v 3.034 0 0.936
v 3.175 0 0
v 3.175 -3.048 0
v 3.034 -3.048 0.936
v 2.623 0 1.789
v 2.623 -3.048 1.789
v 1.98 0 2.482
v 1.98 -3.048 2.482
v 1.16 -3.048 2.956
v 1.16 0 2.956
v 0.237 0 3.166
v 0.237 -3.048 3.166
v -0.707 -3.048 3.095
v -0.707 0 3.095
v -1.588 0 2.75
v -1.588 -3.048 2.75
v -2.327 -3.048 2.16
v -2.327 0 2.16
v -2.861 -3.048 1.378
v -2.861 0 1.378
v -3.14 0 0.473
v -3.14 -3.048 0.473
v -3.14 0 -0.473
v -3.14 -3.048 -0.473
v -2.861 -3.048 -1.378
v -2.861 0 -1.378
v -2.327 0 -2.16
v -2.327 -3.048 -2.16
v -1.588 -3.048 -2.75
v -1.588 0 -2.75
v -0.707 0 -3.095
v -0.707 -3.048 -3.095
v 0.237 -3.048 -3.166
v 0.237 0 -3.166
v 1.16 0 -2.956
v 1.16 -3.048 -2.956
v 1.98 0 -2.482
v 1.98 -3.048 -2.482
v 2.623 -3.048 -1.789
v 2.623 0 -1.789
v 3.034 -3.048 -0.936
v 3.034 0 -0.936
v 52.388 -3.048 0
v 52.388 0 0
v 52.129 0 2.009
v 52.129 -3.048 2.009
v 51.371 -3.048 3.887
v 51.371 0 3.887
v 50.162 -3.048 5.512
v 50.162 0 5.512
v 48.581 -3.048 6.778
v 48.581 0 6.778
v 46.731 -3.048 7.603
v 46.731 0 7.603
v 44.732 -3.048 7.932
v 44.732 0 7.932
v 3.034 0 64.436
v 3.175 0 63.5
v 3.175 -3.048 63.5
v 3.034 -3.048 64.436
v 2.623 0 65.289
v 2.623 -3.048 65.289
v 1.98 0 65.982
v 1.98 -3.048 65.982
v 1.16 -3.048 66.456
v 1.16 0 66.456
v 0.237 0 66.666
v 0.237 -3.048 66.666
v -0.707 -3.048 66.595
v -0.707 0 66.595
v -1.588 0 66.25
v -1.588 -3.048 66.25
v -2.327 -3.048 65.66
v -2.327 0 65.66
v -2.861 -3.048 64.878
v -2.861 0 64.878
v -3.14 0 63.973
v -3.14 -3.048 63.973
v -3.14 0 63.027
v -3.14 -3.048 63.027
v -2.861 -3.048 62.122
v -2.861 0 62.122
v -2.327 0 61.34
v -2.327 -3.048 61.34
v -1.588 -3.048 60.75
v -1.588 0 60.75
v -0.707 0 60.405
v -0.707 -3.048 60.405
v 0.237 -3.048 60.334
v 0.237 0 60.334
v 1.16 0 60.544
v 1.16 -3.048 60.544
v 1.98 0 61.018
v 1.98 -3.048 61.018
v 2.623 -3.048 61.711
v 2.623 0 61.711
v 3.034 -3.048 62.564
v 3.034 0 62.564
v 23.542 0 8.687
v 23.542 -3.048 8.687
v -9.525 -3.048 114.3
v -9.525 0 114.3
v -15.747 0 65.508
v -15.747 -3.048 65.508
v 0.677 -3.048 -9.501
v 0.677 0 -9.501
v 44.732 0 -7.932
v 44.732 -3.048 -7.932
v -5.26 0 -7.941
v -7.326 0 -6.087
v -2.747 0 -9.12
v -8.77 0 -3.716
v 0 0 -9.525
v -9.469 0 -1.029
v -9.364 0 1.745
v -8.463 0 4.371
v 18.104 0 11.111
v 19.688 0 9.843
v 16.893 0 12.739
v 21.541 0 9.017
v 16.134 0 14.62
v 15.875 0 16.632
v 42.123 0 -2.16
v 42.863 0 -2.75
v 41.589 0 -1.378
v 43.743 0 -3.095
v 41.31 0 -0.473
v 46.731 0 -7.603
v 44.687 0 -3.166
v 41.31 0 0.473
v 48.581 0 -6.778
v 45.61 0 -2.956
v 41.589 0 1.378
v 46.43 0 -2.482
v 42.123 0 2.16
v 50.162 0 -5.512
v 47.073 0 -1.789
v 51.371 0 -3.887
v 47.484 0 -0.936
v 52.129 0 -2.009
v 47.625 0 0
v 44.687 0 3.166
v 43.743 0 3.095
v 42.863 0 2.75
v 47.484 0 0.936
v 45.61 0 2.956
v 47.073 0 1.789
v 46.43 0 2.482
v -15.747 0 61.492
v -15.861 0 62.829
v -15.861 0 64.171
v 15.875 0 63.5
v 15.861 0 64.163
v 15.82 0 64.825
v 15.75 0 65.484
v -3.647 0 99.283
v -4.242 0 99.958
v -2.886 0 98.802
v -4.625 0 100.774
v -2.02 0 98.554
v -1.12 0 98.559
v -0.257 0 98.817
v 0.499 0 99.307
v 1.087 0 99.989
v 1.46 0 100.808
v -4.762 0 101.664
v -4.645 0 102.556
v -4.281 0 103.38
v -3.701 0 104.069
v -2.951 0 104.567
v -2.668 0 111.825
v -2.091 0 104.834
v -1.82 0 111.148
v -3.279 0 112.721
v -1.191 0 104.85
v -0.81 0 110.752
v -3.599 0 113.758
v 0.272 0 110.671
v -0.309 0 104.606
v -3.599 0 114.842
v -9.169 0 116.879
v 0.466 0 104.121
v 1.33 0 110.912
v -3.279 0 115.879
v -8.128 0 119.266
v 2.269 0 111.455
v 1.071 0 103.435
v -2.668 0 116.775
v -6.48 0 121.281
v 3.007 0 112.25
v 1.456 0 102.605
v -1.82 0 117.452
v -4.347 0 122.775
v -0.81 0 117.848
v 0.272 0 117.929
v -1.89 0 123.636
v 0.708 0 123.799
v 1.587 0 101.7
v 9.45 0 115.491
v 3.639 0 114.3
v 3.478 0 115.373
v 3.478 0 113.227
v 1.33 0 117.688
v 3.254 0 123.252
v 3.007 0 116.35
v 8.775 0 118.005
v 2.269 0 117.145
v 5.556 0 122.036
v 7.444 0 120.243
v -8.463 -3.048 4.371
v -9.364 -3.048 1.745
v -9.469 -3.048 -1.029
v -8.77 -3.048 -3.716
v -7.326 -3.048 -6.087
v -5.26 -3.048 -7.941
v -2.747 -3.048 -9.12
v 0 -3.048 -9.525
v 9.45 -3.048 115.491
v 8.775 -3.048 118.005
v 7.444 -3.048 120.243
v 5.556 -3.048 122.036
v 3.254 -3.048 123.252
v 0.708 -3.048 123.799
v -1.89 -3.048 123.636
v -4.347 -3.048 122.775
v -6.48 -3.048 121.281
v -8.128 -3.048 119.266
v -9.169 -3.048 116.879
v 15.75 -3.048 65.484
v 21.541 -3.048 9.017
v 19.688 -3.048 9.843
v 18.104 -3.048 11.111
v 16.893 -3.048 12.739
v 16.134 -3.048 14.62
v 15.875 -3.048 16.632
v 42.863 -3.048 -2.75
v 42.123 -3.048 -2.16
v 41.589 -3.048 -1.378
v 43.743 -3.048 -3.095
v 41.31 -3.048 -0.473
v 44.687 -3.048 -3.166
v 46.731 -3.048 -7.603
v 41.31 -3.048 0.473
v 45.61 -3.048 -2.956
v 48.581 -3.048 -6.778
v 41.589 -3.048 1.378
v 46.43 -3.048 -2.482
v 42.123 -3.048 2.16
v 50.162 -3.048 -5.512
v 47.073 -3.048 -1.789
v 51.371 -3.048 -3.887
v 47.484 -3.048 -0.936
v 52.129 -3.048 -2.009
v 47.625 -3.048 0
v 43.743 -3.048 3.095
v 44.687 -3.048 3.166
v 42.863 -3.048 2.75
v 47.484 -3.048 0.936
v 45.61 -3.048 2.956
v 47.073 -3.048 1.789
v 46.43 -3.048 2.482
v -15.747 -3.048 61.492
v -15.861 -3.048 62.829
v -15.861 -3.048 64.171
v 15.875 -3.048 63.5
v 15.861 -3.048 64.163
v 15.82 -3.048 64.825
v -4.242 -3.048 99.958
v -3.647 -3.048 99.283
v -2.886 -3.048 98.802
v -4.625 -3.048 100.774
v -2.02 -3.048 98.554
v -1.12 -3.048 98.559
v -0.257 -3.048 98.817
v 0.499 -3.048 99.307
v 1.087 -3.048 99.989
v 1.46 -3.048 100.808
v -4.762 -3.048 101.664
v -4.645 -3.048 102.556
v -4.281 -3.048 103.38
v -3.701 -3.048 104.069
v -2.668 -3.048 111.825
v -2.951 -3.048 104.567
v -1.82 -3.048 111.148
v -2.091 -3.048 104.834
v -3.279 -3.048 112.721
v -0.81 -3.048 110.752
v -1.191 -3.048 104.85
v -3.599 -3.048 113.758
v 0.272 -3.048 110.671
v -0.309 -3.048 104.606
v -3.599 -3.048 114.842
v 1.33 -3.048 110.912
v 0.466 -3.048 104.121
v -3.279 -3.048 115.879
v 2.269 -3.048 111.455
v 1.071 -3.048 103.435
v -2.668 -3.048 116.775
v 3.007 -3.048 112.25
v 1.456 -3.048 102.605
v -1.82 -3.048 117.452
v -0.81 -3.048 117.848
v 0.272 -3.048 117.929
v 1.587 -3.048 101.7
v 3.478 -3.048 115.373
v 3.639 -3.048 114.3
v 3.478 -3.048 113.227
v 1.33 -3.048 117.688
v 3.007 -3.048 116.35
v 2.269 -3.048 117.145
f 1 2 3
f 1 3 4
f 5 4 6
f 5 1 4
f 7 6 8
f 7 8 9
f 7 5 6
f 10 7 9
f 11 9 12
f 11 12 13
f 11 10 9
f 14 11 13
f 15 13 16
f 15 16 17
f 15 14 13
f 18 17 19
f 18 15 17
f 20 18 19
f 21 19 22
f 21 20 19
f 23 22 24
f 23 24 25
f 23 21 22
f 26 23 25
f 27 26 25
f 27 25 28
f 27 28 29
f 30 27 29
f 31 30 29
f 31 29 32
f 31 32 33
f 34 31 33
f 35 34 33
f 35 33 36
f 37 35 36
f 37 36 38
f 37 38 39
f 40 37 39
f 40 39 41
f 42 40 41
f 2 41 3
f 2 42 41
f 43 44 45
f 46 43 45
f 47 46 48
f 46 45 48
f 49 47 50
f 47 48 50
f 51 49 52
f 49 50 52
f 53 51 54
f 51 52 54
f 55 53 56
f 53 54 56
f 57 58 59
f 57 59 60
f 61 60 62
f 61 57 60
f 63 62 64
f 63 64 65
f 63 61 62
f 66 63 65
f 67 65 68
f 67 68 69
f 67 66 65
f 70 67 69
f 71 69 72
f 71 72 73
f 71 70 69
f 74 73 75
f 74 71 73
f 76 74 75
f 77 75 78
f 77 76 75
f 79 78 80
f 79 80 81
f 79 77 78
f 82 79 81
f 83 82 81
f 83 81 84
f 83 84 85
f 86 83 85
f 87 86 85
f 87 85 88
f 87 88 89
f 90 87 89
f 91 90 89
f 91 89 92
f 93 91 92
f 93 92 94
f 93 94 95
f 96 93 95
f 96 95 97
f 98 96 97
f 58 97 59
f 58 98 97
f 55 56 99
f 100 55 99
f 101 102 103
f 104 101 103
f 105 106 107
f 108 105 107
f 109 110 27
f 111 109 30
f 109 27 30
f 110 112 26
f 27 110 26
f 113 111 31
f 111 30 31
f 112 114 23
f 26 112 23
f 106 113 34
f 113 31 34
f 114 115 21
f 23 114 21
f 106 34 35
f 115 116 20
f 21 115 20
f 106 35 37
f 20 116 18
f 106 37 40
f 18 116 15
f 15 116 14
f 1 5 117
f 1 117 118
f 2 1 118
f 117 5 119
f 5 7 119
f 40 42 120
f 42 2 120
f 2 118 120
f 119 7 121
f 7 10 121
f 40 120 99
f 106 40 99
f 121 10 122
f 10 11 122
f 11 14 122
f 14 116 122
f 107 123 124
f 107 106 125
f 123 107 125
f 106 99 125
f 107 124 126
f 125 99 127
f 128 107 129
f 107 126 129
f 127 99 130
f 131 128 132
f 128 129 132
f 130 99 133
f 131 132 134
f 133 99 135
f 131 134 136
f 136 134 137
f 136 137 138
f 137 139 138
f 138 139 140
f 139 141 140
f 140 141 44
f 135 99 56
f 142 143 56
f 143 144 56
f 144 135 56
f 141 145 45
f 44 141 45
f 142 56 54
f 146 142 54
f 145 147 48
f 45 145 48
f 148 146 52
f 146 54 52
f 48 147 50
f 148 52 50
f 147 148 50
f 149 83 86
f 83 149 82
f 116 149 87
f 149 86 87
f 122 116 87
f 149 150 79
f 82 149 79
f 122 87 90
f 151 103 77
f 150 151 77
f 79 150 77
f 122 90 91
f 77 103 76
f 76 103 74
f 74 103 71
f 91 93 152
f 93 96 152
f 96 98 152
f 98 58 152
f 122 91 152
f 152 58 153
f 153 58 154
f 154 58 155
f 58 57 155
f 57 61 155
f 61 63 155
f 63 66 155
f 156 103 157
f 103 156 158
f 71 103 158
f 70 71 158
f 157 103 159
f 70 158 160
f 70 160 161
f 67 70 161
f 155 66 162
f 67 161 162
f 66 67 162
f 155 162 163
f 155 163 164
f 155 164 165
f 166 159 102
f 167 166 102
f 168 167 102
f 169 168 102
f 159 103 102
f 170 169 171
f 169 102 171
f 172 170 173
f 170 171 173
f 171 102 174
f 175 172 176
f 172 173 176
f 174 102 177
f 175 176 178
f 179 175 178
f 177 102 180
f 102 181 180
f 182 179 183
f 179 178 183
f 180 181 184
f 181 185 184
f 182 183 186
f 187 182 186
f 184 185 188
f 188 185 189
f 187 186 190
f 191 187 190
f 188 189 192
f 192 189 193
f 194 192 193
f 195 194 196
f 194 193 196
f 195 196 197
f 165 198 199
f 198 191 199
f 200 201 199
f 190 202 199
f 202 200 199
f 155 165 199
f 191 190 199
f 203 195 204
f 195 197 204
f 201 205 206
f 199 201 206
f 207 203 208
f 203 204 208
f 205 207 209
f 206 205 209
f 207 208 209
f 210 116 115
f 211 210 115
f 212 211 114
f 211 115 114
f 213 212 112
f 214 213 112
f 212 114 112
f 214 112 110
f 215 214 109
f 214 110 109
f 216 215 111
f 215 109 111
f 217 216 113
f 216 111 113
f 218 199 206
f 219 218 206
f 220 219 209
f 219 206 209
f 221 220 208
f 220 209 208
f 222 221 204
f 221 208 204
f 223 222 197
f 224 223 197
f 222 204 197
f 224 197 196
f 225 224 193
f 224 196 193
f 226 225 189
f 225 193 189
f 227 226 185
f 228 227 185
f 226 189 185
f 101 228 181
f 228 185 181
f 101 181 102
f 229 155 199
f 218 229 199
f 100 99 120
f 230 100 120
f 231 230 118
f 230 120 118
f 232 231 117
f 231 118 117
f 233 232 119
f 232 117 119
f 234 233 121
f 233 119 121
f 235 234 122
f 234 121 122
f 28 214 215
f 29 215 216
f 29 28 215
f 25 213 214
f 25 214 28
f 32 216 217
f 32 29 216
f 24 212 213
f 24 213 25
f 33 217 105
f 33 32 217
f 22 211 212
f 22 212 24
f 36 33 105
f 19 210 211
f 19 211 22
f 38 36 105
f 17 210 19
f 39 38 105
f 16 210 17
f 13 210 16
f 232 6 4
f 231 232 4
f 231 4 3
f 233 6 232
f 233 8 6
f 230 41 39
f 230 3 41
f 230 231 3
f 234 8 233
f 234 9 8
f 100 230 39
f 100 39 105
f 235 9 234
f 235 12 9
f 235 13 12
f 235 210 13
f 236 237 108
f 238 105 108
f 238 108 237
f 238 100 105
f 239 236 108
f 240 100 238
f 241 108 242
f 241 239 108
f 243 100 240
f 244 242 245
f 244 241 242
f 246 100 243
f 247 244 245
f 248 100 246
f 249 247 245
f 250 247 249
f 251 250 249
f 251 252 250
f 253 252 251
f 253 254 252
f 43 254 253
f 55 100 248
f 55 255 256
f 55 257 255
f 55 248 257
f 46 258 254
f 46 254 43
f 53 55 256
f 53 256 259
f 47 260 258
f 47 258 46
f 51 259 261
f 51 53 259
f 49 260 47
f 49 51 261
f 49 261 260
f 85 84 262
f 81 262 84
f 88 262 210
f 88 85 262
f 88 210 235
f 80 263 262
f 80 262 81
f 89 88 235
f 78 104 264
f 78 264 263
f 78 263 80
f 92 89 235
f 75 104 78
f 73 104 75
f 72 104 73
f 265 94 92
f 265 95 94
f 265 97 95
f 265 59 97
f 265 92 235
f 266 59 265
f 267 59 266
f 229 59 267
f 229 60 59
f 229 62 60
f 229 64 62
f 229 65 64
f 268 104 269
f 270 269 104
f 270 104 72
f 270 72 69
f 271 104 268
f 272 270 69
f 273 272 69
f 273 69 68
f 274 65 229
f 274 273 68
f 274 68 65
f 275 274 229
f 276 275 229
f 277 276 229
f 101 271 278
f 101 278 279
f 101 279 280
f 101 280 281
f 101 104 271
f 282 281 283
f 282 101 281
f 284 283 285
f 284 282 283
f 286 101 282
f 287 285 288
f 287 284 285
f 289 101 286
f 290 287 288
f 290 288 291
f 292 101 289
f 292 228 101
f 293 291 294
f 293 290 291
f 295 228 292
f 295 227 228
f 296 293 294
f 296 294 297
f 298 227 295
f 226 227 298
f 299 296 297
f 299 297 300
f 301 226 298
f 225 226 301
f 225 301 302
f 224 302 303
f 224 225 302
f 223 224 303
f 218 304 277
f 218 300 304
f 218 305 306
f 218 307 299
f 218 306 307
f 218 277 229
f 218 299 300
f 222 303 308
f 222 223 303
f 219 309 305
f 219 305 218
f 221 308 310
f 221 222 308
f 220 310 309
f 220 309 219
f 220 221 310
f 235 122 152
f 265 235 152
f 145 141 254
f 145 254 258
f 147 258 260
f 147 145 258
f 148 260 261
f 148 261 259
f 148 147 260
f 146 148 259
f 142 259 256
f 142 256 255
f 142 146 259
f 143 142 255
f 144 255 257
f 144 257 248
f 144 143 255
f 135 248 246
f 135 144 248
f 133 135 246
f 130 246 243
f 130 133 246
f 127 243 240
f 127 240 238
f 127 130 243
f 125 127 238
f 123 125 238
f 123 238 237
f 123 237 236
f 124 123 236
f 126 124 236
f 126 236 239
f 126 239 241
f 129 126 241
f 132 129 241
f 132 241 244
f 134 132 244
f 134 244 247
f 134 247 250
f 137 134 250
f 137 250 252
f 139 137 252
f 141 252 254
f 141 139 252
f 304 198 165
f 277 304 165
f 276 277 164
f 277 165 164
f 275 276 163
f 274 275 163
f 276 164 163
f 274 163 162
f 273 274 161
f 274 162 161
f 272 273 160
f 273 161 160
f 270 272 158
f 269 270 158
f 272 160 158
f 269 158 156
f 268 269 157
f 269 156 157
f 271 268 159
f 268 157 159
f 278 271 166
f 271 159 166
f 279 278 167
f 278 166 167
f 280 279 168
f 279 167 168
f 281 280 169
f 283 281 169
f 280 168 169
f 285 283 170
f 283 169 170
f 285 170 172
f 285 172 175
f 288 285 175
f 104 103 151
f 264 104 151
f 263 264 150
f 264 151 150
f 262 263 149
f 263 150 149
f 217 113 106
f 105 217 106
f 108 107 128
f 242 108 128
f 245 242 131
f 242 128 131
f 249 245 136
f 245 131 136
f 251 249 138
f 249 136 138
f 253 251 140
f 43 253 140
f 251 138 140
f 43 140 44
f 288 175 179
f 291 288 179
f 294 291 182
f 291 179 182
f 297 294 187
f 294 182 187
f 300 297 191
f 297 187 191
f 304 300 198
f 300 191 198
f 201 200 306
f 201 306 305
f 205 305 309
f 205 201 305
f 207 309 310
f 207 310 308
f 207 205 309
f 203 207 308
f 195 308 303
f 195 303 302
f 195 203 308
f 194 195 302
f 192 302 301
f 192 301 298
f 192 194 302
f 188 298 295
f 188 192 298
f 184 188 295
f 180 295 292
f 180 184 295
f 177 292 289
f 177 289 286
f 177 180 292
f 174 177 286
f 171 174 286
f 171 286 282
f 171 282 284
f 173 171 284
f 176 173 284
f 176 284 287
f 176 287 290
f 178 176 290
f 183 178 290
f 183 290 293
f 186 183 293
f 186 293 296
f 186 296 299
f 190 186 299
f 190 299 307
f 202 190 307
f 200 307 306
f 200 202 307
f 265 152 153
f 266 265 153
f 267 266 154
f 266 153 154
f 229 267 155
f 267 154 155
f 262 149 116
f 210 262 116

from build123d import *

# Parameters (mm, degrees)
F0_R     = 3.639412
F0_R_2   = 3.175
F1_DEPTH = 3.048


with BuildPart() as f1:
    # F0 (on Front) → F1 (new body)
    with BuildSketch(Plane.XZ):
        with BuildLine():
            ThreePointArc((9.450293, 115.490625), (9.506305, 114.896483), (9.525, 114.3))
            ThreePointArc((9.525, 114.3), (6.300195, 107.15625), (-1.190625, 104.849707))
            ThreePointArc((-1.190625, 104.849707), (-7.14375, 107.999805), (-9.525, 114.3))
            Line((-9.525, 114.3), (-15.747457, 65.508289))
            ThreePointArc((-15.747457, 65.508289), (0.012053, 79.374995), (15.750488, 65.484375))
            Line((15.750488, 65.484375), (9.450293, 115.490625))
        make_face()
        with BuildLine():
            ThreePointArc((1.5875, 101.699609), (-3.96875, 99.599544), (-1.190625, 104.849707))
            ThreePointArc((-1.190625, 104.849707), (0.79375, 103.799675), (1.5875, 101.699609))
        make_face(mode=Mode.SUBTRACT)
        with BuildLine():
            ThreePointArc((-1.190625, 104.849707), (6.300195, 107.15625), (9.525, 114.3))
            ThreePointArc((9.525, 114.3), (9.506305, 114.896483), (9.450293, 115.490625))
            ThreePointArc((9.450293, 115.490625), (-0.596483, 123.806305), (-9.525, 114.3))
            ThreePointArc((-9.525, 114.3), (-7.14375, 107.999805), (-1.190625, 104.849707))
        make_face()
        with Locations((0, 114.3)):
            Circle(F0_R, mode=Mode.SUBTRACT)
        with BuildLine():
            ThreePointArc((15.875, 63.5), (15.843841, 64.494139), (15.750488, 65.484375))
            ThreePointArc((15.750488, 65.484375), (0.012053, 79.374995), (-15.747457, 65.508289))
            ThreePointArc((-15.747457, 65.508289), (-15.875, 63.5), (-15.747457, 61.491711))
            ThreePointArc((-15.747457, 61.491711), (1.006168, 47.656918), (15.875, 63.5))
        make_face()
        with Locations((0, 63.5)):
            Circle(F0_R_2, mode=Mode.SUBTRACT)
        with BuildLine():
            Line((15.875, 16.632032), (15.875, 63.5))
            ThreePointArc((15.875, 63.5), (1.006168, 47.656918), (-15.747457, 61.491711))
            Line((-15.747457, 61.491711), (-8.462807, 4.371101))
            ThreePointArc((-8.462807, 4.371101), (2.249154, 9.255643), (9.525, 0))
            ThreePointArc((9.525, 0), (6.970557, -6.491299), (0.677344, -9.500886))
            Line((0.677344, -9.500886), (44.732405, -7.932475))
            ThreePointArc((44.732405, -7.932475), (36.5125, 0), (44.732405, 7.932475))
            Line((44.732405, 7.932475), (23.542343, 8.686865))
            ThreePointArc((23.542343, 8.686865), (18.104429, 11.111302), (15.875, 16.632032))
        make_face()
        with BuildLine():
            ThreePointArc((9.525, 0), (2.249154, 9.255643), (-8.462807, 4.371101))
            ThreePointArc((-8.462807, 4.371101), (-8.13512, -4.954336), (0, -9.525))
            Line((0, -9.525), (0.677344, -9.500886))
            ThreePointArc((0.677344, -9.500886), (6.970557, -6.491299), (9.525, 0))
        make_face()
        Circle(F0_R_2, mode=Mode.SUBTRACT)
        with BuildLine():
            ThreePointArc((52.3875, 0), (50.161633, 5.51191), (44.732405, 7.932475))
            ThreePointArc((44.732405, 7.932475), (36.5125, 0), (44.732405, -7.932475))
            ThreePointArc((44.732405, -7.932475), (50.161633, -5.51191), (52.3875, 0))
        make_face()
        with Locations((44.45, 0)):
            Circle(F0_R_2, mode=Mode.SUBTRACT)
    extrude(amount=F1_DEPTH)


solid = f1.part
